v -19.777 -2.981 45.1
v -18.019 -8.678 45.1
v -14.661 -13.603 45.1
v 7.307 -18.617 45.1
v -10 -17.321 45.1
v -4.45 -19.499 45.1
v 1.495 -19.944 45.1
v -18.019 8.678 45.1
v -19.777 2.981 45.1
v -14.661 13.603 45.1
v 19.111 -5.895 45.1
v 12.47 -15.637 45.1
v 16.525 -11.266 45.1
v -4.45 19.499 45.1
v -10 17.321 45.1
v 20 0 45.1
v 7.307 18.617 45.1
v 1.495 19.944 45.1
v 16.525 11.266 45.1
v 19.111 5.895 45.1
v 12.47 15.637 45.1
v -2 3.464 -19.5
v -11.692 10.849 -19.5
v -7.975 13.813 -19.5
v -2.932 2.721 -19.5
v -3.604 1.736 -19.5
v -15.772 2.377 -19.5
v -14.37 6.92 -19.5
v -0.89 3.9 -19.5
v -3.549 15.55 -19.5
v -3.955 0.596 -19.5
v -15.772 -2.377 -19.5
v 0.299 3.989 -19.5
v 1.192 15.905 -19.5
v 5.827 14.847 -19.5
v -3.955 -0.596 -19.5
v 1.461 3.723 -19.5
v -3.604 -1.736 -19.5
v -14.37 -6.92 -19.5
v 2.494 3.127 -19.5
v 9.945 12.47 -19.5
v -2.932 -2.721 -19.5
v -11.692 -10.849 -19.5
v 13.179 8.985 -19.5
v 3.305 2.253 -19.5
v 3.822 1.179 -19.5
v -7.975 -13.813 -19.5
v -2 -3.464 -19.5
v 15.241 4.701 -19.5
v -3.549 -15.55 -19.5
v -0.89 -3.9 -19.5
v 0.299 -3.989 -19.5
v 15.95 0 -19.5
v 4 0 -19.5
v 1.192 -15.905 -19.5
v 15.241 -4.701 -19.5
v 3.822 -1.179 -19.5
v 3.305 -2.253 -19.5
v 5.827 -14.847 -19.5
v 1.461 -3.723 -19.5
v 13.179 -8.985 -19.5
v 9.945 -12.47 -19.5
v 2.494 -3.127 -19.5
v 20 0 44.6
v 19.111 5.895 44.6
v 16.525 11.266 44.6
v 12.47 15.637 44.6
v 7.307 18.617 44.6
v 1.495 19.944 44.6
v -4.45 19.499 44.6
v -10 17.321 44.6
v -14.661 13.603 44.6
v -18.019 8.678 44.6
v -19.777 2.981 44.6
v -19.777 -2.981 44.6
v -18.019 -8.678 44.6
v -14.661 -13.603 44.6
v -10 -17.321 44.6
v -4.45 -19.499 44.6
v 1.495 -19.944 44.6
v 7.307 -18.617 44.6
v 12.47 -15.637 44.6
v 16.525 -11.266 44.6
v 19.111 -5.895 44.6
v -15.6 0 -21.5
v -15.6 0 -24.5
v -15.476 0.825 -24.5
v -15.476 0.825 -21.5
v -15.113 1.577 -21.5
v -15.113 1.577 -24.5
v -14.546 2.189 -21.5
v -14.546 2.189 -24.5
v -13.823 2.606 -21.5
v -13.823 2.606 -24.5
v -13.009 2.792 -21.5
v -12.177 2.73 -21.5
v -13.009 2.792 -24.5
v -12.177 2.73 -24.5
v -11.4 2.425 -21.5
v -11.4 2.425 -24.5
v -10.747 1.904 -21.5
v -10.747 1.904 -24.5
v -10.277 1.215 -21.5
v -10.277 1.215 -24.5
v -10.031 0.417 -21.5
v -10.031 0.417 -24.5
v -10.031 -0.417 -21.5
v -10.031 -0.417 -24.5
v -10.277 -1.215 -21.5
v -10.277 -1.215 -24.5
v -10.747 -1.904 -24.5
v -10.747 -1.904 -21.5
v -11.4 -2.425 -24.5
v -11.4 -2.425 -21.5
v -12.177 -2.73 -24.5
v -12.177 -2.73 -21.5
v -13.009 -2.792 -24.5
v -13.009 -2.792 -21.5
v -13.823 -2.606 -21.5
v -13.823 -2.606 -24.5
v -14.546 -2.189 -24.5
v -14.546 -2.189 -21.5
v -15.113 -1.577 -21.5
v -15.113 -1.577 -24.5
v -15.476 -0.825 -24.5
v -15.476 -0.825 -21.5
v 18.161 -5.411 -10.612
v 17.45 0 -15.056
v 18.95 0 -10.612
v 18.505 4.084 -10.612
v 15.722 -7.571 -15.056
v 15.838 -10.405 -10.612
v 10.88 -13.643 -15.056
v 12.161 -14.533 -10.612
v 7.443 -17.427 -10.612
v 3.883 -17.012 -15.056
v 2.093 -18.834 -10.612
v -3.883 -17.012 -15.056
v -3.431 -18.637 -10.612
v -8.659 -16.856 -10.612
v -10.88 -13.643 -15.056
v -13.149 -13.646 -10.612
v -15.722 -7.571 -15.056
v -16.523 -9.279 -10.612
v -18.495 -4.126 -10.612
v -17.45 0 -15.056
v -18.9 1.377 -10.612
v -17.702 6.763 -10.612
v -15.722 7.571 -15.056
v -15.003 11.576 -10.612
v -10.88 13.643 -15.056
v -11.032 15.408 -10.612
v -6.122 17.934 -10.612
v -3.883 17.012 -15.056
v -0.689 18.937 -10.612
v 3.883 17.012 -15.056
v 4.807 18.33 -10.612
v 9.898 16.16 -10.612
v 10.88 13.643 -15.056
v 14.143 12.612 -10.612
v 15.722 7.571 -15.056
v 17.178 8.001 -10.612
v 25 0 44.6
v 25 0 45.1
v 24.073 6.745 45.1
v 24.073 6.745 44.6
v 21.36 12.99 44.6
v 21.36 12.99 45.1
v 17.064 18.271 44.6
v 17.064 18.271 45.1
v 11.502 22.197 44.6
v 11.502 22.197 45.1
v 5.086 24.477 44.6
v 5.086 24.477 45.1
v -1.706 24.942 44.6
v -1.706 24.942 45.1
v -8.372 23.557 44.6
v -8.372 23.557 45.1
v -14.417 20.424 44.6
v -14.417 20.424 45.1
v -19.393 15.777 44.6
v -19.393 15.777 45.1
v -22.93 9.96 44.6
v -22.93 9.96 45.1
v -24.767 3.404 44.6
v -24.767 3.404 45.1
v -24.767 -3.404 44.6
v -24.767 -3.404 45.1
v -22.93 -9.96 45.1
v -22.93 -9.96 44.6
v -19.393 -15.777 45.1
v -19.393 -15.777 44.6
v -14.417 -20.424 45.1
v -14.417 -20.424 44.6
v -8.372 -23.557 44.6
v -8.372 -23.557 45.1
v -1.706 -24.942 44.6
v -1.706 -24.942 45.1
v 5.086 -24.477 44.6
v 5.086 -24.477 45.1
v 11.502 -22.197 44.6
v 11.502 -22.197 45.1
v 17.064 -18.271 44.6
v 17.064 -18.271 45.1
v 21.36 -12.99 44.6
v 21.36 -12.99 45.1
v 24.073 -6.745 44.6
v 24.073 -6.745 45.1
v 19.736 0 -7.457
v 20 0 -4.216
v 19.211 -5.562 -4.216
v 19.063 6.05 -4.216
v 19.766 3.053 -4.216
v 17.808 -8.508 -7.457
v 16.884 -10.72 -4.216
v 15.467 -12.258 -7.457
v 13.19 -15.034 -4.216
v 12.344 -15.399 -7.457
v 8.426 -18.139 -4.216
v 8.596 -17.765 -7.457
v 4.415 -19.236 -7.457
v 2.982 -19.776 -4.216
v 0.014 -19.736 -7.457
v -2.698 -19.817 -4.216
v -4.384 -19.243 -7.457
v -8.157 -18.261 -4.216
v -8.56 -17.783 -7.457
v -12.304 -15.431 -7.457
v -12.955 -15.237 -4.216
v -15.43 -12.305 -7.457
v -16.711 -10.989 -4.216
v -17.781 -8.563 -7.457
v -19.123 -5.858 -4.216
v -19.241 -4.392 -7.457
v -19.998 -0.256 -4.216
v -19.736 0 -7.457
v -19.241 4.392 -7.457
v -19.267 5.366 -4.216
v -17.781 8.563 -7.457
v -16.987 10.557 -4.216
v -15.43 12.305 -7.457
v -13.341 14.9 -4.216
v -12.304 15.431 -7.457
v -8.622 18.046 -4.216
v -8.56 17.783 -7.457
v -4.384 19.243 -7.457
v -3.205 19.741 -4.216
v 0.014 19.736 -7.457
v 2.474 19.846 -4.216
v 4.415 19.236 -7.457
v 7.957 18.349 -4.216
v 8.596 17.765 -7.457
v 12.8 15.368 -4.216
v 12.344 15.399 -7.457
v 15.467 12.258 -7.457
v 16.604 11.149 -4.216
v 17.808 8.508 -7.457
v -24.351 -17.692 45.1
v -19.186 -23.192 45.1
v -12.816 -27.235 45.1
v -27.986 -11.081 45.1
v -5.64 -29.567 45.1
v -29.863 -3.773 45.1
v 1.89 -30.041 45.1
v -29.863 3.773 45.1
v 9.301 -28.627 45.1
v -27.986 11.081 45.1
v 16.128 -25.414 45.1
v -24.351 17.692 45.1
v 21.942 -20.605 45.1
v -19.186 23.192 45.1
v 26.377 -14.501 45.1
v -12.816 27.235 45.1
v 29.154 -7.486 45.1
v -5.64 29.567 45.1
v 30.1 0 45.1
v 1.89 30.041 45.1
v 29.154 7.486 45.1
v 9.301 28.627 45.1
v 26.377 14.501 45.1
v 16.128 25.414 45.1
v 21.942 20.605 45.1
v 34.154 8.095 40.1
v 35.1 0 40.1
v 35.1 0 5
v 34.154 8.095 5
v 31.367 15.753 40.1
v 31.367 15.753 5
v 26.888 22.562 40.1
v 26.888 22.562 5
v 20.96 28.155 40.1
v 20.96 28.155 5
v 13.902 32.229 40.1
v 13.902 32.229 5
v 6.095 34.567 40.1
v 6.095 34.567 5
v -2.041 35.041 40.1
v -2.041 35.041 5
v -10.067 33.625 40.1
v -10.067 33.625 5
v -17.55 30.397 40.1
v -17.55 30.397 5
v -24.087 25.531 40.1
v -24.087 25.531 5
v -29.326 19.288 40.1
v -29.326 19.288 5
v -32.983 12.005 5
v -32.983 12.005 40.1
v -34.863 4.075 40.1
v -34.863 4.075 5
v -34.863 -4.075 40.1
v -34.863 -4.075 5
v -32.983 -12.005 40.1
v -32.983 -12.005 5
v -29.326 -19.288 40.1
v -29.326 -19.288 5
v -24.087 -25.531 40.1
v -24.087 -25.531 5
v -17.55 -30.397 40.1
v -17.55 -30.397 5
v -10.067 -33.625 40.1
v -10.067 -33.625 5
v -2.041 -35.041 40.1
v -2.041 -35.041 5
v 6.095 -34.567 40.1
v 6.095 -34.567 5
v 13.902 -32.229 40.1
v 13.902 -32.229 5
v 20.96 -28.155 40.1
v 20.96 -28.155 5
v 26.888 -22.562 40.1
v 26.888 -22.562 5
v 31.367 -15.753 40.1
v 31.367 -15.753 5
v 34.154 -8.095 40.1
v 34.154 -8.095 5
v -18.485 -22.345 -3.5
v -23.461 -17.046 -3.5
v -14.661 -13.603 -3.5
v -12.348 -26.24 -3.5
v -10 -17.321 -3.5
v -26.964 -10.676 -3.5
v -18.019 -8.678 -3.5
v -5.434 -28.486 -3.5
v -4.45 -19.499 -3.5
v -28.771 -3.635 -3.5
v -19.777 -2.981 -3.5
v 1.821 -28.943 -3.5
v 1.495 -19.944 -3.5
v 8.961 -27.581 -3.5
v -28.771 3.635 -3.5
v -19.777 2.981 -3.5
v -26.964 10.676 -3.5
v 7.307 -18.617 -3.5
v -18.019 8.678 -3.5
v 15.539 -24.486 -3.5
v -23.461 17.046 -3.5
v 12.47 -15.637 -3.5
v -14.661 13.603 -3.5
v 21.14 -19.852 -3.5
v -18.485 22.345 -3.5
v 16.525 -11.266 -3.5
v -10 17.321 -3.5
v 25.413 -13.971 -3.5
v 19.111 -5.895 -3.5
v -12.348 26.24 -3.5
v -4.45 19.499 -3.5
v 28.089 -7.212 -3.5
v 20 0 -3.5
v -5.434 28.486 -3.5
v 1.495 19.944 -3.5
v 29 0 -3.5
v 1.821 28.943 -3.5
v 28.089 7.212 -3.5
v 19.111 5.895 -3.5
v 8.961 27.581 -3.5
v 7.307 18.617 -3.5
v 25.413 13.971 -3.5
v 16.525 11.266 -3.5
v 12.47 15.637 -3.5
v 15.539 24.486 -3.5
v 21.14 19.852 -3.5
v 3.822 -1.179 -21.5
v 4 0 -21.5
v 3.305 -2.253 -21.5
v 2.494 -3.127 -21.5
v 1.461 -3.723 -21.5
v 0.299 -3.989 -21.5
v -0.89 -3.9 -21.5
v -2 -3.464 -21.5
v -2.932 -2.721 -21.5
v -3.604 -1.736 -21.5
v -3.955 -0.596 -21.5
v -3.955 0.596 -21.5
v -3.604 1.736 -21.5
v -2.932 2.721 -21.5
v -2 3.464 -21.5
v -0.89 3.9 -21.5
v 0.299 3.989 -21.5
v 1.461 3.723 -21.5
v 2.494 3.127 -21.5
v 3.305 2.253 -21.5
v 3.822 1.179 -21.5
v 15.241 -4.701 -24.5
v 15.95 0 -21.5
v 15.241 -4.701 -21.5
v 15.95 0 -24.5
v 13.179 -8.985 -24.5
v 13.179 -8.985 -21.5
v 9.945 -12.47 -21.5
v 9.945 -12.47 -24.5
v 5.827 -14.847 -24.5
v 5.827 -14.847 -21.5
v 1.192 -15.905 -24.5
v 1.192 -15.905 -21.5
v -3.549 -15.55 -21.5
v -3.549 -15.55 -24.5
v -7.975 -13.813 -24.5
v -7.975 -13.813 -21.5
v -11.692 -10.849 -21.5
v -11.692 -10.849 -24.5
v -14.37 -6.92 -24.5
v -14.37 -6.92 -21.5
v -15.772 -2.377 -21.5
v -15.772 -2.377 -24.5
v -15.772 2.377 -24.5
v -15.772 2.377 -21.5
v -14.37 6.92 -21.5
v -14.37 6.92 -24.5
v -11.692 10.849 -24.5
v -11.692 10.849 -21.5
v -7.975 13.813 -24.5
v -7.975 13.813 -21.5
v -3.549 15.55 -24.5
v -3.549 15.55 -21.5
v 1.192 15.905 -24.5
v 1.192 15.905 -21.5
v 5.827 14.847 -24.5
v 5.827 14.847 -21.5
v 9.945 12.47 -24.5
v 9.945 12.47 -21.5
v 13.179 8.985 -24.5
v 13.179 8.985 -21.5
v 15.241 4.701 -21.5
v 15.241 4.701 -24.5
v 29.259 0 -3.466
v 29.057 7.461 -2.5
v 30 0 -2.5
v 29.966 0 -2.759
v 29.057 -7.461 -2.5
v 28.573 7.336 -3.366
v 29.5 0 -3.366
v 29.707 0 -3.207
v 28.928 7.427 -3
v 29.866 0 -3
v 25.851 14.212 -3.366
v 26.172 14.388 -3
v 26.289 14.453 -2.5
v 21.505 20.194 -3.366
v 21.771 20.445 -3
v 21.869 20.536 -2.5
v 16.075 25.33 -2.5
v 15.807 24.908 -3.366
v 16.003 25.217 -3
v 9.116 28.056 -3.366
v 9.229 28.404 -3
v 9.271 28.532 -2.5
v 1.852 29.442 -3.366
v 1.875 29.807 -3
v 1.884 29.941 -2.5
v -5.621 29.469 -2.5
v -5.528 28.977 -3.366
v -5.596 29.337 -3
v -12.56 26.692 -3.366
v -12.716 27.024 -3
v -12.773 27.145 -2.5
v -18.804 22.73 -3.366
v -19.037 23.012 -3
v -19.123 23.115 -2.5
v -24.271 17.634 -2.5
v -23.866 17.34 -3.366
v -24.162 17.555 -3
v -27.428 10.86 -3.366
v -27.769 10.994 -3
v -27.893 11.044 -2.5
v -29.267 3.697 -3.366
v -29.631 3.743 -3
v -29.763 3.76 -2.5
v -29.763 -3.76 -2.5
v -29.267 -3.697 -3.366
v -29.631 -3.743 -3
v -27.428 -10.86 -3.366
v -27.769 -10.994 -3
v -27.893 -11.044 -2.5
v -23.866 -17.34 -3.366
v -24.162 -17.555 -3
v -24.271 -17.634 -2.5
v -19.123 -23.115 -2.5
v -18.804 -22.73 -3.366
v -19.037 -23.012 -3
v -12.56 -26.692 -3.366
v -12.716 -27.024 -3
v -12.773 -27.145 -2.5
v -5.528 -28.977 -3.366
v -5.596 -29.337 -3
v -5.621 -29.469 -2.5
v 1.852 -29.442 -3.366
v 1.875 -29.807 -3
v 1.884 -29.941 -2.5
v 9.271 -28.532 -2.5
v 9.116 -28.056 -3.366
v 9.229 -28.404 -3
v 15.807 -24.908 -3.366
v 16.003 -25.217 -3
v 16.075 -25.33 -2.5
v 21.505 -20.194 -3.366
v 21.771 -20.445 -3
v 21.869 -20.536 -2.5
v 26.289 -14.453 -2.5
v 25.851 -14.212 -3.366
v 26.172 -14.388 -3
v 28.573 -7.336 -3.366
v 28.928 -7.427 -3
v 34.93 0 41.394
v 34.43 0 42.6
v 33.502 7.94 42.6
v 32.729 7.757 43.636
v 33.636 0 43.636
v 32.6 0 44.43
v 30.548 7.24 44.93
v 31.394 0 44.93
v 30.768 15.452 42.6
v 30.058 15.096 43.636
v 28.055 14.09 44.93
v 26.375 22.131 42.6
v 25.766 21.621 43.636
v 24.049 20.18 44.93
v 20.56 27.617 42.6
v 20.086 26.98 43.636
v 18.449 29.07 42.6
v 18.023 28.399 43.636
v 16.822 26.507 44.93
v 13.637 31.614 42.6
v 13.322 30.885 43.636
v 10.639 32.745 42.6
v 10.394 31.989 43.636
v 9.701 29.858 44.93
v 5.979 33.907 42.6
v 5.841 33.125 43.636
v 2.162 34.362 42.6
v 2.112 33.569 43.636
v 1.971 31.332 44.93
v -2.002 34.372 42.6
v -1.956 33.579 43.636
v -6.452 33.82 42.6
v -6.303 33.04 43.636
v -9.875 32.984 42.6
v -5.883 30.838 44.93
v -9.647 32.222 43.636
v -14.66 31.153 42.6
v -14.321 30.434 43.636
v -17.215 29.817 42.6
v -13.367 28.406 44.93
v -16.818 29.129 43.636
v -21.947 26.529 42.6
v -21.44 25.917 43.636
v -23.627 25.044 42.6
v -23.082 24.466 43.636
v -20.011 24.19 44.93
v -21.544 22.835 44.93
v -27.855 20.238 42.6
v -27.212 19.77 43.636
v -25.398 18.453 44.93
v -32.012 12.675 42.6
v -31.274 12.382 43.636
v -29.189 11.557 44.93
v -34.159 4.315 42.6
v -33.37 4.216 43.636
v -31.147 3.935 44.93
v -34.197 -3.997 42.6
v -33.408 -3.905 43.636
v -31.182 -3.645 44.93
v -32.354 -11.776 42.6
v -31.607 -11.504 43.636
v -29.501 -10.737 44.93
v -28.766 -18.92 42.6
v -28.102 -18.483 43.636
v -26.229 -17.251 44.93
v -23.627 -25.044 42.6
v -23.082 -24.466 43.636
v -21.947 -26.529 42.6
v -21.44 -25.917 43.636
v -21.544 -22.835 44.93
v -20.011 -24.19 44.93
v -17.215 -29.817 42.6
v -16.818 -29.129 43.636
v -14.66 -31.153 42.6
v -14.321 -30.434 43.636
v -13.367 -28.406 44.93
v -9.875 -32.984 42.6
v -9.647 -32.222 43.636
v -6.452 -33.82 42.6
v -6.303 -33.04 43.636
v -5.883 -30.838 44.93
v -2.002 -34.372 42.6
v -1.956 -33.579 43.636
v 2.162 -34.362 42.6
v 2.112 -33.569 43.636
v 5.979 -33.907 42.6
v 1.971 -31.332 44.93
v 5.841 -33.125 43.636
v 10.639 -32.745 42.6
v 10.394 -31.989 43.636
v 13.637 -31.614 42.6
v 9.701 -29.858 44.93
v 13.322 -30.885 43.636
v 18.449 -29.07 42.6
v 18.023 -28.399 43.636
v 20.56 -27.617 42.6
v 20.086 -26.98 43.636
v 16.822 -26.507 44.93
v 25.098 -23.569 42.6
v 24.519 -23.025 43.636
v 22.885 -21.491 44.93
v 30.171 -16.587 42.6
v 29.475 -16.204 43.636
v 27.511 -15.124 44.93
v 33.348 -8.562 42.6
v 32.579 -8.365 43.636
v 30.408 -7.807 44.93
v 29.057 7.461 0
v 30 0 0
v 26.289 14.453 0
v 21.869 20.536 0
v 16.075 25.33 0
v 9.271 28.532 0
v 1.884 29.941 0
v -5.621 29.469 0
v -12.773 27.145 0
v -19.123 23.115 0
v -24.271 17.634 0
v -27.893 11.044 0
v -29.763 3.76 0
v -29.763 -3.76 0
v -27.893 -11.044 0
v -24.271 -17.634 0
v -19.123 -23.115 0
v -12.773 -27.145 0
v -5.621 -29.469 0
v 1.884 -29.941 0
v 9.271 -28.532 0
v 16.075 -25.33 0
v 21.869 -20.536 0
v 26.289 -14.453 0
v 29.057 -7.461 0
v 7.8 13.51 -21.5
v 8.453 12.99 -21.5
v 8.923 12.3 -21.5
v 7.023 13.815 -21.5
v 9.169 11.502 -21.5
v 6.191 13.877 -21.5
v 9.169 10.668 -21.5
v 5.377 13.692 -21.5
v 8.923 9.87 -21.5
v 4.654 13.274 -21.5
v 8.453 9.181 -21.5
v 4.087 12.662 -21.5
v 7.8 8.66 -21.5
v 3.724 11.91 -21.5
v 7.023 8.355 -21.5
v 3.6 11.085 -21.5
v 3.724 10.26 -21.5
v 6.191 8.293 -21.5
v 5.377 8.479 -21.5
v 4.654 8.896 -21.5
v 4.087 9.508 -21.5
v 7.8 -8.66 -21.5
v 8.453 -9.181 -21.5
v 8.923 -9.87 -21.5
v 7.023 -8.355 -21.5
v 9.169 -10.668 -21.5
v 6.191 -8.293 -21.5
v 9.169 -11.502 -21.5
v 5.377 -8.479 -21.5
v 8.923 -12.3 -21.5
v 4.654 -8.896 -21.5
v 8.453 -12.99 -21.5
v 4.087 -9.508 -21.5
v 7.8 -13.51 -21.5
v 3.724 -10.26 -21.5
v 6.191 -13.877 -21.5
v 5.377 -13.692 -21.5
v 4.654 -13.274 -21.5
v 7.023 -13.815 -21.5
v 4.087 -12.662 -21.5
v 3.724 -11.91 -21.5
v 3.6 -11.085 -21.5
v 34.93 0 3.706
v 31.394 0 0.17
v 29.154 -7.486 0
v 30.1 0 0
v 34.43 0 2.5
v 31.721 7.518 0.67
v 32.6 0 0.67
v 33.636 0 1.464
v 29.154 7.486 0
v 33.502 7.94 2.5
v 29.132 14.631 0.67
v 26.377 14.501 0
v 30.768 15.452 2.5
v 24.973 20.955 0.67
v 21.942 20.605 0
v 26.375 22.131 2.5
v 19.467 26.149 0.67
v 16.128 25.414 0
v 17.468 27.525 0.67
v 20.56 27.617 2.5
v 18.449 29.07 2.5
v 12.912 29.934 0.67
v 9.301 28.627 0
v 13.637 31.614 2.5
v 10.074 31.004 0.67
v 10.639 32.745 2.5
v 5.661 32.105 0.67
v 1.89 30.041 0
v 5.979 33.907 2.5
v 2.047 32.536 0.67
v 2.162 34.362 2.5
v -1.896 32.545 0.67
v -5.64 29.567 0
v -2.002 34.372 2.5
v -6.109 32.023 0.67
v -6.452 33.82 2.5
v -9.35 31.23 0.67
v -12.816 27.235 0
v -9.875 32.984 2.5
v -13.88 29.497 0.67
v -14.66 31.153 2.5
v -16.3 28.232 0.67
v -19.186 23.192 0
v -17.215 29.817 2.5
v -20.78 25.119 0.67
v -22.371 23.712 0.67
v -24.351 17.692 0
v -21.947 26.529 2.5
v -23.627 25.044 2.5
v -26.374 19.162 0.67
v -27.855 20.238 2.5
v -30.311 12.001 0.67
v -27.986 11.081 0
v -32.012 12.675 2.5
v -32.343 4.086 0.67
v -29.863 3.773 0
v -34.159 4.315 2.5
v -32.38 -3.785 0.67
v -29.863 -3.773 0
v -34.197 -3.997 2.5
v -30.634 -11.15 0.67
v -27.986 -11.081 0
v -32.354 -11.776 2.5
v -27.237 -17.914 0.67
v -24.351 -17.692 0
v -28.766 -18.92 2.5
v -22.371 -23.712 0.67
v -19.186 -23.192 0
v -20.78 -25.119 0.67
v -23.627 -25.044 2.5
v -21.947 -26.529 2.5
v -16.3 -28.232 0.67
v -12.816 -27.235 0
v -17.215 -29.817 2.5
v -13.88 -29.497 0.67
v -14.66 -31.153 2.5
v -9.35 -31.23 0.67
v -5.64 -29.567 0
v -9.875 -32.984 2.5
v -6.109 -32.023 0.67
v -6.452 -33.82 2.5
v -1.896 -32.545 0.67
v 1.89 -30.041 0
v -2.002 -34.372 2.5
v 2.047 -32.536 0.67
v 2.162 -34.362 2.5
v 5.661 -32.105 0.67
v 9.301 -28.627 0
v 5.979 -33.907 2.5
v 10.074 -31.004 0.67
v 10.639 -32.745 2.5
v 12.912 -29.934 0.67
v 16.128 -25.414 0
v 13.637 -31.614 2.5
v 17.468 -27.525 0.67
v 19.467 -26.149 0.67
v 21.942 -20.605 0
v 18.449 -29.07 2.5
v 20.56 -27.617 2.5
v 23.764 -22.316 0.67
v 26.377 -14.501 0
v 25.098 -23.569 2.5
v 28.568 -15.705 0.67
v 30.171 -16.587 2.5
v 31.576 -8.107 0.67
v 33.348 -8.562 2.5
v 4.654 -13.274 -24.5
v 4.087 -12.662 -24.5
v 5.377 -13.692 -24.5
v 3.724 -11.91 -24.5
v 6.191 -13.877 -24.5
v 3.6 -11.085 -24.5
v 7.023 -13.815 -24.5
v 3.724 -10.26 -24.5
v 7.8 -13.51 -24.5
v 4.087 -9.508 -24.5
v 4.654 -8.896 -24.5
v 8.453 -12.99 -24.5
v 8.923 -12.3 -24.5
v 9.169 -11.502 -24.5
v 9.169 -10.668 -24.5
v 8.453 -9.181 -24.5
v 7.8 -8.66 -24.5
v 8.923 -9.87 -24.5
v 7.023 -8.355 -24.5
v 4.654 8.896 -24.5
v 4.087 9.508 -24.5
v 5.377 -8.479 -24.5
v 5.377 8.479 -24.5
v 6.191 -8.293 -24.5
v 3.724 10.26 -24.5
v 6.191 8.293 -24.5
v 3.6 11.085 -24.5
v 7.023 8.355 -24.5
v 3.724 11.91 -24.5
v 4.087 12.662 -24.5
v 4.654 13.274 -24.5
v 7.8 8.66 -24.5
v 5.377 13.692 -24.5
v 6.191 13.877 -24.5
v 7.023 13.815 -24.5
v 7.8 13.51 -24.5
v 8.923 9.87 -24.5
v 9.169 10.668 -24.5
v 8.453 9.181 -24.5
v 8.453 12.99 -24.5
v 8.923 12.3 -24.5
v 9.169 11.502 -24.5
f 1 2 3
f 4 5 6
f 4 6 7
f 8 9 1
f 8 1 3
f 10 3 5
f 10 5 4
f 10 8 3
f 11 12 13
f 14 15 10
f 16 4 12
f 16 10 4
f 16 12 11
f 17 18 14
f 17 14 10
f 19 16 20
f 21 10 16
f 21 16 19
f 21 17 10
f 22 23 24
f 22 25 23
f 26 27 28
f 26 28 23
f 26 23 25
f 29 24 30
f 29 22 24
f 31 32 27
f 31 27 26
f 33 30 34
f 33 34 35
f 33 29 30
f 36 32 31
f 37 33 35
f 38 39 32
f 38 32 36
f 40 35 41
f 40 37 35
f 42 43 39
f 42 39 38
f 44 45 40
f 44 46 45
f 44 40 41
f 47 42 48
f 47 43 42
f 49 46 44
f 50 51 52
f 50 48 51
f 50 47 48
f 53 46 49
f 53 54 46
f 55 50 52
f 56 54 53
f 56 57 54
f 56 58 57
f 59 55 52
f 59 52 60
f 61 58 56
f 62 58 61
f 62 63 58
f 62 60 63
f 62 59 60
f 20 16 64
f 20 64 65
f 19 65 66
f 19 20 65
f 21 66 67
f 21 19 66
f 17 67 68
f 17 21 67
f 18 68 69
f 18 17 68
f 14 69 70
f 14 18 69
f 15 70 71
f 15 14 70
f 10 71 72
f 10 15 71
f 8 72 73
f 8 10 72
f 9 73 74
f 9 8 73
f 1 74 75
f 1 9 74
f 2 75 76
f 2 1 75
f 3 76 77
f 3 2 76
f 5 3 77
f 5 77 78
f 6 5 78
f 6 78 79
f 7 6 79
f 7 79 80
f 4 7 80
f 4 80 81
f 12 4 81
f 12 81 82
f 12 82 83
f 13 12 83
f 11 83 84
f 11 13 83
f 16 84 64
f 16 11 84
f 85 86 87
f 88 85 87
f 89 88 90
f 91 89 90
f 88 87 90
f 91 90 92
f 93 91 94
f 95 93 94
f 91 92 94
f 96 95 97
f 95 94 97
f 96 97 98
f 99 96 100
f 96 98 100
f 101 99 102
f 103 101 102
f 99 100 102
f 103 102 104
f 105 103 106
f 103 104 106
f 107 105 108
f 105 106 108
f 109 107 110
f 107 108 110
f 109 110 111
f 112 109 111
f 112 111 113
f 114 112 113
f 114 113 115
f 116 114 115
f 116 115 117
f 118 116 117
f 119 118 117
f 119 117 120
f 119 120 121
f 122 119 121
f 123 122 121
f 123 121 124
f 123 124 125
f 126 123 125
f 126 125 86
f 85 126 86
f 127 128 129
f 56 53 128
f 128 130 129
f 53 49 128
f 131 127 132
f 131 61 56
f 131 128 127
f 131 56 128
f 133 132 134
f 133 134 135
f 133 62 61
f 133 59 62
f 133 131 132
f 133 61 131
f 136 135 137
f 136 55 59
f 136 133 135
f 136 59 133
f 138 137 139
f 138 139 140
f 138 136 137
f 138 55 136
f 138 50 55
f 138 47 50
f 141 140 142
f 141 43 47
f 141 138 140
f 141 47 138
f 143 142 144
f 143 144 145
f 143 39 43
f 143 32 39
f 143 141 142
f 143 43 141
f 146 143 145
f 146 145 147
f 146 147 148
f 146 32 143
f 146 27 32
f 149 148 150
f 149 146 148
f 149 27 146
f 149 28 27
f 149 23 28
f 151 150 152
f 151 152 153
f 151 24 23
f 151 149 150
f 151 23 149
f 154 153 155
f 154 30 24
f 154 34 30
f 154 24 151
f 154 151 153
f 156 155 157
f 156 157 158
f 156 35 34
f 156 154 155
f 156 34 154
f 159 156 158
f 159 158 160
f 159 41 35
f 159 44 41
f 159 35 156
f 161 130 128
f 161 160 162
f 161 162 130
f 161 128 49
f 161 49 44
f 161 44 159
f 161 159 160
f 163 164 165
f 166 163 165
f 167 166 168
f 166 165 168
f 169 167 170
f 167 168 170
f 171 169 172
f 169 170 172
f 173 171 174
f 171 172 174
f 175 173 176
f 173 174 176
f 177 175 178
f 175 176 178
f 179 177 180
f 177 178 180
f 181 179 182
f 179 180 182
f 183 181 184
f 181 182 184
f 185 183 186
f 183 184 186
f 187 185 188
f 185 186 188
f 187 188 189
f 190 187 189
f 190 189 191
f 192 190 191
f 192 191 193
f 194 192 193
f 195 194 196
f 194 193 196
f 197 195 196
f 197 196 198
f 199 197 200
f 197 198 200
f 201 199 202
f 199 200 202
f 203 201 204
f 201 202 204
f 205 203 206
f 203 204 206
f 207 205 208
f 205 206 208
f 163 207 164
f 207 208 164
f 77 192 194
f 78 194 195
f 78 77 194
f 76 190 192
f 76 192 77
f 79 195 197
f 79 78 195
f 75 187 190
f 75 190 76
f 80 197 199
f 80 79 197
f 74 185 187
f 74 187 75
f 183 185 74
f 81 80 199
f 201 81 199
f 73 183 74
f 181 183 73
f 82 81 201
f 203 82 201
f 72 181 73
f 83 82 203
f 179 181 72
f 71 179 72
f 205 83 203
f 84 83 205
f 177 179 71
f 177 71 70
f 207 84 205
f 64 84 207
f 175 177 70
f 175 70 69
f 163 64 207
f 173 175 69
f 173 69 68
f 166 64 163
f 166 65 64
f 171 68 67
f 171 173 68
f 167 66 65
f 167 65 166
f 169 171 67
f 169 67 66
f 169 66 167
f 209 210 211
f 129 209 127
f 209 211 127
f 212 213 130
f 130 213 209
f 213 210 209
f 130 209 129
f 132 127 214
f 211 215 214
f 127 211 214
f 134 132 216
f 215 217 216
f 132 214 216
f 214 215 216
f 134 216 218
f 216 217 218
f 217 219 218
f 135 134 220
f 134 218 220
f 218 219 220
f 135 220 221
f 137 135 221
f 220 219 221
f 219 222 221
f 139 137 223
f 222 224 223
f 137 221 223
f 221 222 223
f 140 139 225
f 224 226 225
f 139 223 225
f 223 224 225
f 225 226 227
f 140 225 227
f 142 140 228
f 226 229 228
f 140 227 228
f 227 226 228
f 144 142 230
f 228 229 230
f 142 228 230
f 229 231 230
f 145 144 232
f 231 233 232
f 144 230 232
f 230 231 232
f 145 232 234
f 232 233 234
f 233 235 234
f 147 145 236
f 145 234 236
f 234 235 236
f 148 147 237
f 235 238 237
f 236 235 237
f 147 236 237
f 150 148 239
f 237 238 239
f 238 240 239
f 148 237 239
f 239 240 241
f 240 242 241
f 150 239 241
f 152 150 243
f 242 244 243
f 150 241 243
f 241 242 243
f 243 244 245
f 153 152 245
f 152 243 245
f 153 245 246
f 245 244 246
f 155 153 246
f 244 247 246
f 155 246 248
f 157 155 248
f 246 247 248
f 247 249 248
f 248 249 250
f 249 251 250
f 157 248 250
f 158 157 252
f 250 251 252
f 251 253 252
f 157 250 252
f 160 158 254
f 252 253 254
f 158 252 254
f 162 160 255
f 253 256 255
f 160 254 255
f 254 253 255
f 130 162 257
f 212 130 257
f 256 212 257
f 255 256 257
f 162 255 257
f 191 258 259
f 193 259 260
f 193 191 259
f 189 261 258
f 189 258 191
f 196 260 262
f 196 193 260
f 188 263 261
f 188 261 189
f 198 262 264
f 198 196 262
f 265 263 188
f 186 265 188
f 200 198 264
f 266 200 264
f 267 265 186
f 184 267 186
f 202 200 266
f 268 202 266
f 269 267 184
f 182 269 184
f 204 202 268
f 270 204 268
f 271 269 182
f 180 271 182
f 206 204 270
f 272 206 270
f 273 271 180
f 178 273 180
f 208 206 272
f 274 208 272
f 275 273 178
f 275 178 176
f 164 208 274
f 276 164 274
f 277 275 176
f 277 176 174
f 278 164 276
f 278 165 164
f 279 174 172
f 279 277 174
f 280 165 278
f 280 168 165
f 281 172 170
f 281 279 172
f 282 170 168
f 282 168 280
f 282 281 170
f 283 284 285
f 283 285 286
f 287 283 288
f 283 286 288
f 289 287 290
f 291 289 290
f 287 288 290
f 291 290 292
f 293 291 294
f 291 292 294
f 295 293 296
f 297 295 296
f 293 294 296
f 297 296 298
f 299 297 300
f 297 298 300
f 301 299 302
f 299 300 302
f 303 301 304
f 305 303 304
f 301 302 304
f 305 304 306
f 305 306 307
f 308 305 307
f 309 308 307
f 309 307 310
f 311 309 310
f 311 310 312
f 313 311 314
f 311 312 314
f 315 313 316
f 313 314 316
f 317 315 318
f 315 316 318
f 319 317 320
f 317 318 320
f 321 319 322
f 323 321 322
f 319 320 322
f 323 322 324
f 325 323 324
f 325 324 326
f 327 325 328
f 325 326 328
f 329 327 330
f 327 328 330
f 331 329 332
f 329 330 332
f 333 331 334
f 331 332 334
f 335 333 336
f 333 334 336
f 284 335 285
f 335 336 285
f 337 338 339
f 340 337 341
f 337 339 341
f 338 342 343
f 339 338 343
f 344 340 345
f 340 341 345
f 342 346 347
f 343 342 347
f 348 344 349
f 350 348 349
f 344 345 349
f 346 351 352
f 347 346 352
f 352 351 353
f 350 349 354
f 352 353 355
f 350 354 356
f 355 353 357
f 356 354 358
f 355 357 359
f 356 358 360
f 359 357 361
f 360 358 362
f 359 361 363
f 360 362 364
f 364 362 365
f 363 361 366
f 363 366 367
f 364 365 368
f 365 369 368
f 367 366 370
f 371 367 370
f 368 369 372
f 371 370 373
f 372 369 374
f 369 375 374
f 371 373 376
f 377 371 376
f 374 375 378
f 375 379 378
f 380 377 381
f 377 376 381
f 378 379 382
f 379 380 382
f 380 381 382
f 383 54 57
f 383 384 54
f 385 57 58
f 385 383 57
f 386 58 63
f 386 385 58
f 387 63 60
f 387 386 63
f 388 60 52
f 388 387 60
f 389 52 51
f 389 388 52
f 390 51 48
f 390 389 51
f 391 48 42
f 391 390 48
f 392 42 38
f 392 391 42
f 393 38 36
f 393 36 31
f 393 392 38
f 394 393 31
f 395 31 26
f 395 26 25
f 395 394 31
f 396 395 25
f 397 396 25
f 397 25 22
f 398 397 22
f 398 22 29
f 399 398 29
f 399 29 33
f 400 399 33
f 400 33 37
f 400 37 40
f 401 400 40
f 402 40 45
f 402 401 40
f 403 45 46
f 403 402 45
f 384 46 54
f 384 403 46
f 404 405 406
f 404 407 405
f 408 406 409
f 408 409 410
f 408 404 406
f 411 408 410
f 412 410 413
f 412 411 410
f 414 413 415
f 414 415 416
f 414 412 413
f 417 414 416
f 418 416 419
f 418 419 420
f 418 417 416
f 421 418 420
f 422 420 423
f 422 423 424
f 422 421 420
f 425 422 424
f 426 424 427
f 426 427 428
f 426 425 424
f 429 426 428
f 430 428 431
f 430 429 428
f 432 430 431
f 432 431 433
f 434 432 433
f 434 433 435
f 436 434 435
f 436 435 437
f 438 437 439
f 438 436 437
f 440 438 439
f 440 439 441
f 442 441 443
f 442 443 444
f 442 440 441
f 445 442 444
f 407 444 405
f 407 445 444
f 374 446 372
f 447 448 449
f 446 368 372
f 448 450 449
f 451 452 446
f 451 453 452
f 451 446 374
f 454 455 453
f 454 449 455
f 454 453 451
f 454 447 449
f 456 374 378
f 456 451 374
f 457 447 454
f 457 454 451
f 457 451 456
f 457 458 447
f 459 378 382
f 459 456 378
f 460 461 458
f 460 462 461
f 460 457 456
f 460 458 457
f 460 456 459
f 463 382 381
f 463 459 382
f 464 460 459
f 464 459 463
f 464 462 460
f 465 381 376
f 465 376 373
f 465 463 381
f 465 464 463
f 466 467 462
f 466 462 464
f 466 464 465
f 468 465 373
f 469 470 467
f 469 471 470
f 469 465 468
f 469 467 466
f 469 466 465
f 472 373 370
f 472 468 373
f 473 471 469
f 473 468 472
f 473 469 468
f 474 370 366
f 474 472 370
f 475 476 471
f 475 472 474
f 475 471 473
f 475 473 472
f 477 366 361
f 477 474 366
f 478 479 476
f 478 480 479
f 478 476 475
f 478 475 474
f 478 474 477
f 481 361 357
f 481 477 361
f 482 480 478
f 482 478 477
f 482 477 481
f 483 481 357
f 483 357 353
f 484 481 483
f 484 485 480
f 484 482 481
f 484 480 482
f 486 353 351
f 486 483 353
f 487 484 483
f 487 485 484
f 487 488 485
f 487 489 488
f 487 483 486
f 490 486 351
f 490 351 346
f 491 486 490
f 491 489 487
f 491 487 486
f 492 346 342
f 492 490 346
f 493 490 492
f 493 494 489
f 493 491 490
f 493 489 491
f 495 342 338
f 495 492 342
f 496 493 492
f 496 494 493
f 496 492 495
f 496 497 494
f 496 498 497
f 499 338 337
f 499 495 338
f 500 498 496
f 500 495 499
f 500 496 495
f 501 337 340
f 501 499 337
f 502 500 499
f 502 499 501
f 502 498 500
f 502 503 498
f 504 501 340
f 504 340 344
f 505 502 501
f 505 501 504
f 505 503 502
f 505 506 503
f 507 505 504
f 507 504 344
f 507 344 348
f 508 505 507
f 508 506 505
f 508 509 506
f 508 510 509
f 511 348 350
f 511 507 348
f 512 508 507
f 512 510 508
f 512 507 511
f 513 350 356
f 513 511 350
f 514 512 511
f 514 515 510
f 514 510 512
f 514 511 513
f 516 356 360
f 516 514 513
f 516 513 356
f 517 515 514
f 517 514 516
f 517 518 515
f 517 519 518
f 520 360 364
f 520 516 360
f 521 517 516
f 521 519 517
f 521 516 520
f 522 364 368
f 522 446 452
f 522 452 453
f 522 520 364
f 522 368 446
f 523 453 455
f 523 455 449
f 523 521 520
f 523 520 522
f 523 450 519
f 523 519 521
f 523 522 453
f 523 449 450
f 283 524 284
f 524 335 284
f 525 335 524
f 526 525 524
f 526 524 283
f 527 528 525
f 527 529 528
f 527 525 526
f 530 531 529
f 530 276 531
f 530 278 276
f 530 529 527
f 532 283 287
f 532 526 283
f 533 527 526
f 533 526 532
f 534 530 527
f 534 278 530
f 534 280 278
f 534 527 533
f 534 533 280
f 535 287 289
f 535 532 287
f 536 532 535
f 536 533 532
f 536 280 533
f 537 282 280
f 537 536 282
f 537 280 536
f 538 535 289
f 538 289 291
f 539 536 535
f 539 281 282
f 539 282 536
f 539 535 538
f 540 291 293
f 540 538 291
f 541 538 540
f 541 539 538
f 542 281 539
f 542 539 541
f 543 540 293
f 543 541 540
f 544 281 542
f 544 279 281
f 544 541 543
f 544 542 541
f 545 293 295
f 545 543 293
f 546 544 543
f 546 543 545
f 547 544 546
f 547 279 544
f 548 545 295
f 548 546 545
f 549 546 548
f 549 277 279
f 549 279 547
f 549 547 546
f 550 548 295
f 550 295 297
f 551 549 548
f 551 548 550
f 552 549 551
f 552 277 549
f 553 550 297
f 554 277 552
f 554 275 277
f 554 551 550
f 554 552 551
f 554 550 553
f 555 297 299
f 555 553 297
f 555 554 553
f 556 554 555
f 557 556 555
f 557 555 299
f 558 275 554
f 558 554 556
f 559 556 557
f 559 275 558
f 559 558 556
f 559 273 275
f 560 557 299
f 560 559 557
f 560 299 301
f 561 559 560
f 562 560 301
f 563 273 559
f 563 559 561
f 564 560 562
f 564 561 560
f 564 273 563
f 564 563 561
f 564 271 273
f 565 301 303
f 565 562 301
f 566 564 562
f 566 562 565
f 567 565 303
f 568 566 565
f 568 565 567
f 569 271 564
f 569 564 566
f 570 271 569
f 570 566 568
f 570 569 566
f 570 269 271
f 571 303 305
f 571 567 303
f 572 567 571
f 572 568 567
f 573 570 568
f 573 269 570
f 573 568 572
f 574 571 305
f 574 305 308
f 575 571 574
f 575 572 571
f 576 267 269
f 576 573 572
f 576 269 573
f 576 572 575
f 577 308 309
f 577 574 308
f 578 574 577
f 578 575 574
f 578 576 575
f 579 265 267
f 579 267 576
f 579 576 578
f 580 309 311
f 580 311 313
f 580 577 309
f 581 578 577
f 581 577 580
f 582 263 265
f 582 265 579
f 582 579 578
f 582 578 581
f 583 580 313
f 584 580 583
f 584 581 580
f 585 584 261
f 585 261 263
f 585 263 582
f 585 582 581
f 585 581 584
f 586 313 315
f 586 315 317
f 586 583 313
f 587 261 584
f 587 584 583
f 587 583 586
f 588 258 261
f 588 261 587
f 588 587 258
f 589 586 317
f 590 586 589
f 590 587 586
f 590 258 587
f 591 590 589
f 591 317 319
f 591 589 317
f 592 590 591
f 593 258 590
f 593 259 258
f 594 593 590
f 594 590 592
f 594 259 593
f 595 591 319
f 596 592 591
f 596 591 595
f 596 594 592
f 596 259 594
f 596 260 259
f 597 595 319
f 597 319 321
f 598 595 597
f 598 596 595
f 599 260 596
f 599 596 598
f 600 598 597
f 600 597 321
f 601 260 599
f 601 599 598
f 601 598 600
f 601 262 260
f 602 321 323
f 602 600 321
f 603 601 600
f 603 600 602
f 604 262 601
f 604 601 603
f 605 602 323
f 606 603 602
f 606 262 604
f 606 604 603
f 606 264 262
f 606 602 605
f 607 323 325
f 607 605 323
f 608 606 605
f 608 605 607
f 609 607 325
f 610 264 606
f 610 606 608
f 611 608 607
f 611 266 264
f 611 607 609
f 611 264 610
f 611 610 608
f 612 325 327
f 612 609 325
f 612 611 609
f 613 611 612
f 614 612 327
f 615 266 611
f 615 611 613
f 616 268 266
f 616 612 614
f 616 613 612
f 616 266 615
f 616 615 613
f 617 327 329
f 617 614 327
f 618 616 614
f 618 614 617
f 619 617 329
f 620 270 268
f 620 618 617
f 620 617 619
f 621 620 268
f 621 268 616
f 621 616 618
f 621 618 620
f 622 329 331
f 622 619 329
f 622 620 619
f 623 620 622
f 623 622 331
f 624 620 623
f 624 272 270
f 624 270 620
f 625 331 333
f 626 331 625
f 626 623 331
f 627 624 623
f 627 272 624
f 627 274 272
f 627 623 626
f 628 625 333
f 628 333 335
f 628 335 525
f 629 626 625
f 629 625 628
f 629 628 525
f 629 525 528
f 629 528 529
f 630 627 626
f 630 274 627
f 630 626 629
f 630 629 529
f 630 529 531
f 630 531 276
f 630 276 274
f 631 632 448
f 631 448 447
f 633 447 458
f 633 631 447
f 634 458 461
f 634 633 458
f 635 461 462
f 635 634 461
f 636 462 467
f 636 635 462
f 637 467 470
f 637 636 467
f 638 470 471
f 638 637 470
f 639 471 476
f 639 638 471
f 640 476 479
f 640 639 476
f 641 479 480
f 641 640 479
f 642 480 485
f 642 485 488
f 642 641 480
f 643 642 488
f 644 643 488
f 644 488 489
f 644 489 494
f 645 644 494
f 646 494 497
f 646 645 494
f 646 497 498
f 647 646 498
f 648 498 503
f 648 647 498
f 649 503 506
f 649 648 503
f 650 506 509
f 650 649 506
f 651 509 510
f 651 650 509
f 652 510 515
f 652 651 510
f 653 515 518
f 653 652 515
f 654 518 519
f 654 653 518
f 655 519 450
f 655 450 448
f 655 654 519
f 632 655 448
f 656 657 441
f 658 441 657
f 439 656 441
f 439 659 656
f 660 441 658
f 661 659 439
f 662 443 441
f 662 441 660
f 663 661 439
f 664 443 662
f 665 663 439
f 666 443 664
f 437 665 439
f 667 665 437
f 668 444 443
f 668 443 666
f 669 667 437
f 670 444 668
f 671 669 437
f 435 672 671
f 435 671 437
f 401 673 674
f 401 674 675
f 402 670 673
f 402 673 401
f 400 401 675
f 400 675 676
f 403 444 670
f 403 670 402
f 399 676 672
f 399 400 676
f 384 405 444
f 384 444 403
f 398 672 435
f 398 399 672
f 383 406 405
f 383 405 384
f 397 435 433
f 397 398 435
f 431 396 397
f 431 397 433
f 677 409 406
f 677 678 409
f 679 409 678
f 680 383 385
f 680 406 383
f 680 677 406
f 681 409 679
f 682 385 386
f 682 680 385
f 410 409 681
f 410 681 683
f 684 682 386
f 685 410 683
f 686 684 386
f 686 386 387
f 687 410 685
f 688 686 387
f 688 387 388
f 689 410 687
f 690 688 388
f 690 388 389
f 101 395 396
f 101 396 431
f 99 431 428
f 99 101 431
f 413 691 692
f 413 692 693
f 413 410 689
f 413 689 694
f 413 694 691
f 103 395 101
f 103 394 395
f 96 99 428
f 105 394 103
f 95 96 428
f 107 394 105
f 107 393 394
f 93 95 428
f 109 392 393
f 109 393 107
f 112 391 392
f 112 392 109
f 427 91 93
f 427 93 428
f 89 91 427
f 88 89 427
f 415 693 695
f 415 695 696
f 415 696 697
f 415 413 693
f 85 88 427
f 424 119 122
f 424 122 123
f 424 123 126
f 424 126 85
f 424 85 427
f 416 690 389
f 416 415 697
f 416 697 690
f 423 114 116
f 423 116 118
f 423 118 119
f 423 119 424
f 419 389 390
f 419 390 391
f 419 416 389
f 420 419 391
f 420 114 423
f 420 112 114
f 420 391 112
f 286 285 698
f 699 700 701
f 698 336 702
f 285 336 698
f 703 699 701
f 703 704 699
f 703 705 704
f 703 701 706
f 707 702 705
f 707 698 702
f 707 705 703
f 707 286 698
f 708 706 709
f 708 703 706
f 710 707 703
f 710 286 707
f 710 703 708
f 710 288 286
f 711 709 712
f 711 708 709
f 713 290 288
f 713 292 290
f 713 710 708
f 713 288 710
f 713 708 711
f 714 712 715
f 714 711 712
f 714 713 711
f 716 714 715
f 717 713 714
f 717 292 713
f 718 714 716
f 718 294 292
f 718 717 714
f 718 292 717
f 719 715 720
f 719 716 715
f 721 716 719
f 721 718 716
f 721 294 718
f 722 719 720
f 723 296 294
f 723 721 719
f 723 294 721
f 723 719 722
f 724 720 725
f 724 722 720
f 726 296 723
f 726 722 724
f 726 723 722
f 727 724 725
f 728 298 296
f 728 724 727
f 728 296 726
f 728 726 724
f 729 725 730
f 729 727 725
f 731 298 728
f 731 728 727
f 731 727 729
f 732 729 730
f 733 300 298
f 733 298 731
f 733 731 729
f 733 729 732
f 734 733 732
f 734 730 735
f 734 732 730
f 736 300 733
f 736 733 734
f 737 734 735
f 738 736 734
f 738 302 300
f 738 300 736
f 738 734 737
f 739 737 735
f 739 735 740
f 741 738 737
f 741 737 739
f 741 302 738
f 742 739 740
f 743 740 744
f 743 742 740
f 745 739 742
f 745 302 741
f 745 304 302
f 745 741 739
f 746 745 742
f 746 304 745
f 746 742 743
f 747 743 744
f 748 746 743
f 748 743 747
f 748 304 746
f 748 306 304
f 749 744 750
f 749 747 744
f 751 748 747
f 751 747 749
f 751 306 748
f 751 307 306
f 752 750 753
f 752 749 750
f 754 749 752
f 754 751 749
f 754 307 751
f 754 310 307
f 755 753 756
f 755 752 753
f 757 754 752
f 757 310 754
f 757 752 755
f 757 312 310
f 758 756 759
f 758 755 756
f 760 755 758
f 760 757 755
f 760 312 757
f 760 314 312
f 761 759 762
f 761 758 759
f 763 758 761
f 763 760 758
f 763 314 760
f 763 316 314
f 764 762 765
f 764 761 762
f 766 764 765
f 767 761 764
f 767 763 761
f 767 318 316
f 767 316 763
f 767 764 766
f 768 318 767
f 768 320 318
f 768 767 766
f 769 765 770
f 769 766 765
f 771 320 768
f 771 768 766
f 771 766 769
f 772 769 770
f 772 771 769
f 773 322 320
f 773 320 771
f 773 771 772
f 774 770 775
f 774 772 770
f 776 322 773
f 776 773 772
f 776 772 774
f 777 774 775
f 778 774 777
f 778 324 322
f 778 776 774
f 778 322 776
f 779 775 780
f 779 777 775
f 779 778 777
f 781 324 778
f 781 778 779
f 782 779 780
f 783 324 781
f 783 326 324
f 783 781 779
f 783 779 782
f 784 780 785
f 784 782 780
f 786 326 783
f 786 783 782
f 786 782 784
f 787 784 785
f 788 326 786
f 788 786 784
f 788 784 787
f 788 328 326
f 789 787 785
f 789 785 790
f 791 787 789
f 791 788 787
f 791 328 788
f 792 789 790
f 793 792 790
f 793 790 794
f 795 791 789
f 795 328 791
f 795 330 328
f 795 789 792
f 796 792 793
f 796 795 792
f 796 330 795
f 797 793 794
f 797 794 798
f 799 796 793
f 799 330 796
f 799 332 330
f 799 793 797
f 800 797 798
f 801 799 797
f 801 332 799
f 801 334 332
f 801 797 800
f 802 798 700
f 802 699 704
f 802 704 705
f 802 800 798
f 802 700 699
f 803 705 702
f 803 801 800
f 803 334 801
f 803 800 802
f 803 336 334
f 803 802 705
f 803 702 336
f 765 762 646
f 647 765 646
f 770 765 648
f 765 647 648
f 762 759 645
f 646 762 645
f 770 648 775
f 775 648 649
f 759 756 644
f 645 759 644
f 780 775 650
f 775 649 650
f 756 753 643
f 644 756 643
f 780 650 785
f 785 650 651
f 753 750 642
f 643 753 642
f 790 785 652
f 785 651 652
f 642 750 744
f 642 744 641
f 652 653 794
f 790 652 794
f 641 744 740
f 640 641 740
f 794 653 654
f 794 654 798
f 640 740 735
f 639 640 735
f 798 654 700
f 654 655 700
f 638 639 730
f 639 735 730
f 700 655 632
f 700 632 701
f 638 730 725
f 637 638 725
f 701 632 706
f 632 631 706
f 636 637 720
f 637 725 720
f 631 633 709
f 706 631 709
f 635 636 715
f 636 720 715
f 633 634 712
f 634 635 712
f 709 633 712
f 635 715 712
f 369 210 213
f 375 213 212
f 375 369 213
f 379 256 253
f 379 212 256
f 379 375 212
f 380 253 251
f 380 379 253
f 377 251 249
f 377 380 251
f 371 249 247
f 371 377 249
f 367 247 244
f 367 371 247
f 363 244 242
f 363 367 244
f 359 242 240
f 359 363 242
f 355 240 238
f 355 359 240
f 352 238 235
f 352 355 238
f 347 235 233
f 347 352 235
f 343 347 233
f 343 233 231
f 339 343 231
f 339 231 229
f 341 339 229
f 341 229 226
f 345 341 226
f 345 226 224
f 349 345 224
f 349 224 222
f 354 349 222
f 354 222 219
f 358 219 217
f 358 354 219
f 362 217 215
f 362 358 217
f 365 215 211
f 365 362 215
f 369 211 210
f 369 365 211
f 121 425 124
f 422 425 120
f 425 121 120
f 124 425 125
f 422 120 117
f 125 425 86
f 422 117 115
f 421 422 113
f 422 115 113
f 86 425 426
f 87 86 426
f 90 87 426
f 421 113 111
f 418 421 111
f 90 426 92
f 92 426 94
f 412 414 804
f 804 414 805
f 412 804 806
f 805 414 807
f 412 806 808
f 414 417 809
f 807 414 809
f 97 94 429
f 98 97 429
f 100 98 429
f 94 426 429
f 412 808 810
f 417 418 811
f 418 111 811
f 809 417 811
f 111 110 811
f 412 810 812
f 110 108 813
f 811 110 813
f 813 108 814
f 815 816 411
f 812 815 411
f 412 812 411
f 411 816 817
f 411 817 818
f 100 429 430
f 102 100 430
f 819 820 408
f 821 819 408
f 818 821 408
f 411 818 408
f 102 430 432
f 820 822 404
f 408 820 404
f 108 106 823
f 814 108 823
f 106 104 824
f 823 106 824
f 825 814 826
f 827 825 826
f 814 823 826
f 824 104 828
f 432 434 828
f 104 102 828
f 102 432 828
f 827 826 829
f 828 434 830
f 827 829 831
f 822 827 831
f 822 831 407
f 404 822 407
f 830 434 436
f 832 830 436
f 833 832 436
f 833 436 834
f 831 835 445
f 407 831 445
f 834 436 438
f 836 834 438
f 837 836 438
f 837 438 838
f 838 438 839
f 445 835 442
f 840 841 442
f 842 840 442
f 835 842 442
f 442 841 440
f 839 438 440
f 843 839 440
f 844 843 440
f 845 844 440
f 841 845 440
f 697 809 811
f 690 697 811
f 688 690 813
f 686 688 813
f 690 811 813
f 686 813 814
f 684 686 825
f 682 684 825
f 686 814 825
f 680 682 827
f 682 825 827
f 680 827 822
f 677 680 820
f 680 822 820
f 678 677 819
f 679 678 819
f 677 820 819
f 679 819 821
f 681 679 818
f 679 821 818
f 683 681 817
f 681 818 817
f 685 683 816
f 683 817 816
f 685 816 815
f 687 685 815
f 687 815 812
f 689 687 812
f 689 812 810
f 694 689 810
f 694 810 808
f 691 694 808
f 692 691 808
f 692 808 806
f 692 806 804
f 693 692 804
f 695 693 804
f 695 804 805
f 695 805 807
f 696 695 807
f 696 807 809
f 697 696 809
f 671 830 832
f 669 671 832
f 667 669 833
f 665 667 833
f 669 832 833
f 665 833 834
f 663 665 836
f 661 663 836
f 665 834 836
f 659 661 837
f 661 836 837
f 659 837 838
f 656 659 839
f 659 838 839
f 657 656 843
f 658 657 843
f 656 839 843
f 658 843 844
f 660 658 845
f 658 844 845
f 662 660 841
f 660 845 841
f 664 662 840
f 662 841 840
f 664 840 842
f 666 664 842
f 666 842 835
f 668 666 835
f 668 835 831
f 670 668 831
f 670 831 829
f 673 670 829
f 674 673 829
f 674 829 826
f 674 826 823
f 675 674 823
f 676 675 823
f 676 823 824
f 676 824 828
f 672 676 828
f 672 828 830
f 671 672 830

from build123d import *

# Parameters (mm, degrees)
SKETCH_1_R          = 35.1
EXTRUDE_1_DEPTH     = 45.1
SKETCH_3_R          = 30
SKETCH_3_R_2        = 20
EXTRUDE_2_DEPTH     = 3.5
SKETCH_3_4_R        = 20
EXTRUDE_3_DEPTH     = 24.5
FILLET_1_R          = 5
FILLET_2_R          = 20
FILLET_3_R          = 1
SKETCH_6_R          = 2.8
CUT_EXTRUDE_1_DEPTH = 4
SKETCH_7_R          = 25
SKETCH_7_R_2        = 20
CUT_EXTRUDE_2_DEPTH = 0.5


with BuildPart() as part:
    # 스케치1 → 보스-돌출1 (new body)
    with BuildSketch(Plane.XY):
        Circle(SKETCH_1_R)
    extrude(amount=EXTRUDE_1_DEPTH)

    # 스케치3 → 보스-돌출2 (add)
    with BuildSketch(Plane.XY):
        Circle(SKETCH_3_R)
        Circle(SKETCH_3_R_2, mode=Mode.SUBTRACT)
    extrude(amount=-EXTRUDE_2_DEPTH)

    # 스케치3<4> → 보스-돌출3 (add)
    with BuildSketch(Plane.XY):
        Circle(SKETCH_3_4_R)
    extrude(amount=-EXTRUDE_3_DEPTH)

    # 스케치4 → 컷-회전2 (revolve, cut)
    with BuildSketch(Plane(origin=(0, 0, 0), x_dir=(1, 0, 0), z_dir=(0, 1, 0))):
        Polygon((-15.95, 24.5), (-20, 24.5), (-20, 7.5), (-15.95, 19.5), (-4, 19.5), (-4, 21.5), (-15.95, 21.5), align=None)
    revolve(axis=Axis((0, 0, -24.5), (0, 0, -1)), mode=Mode.SUBTRACT)

    # 필렛1
    fillet_1_edges = [part.edges().sort_by_distance(p)[0] for p in [
        (-35.1, 0, 45.1),
        (-35.1, 0, 0),
    ]]
    fillet(fillet_1_edges, radius=FILLET_1_R)

    # 필렛2
    fillet_2_edges = [part.edges().sort_by_distance(p)[0] for p in [
        (0, -20, -7.5),
    ]]
    fillet(fillet_2_edges, radius=FILLET_2_R)

    # 필렛3
    fillet_3_edges = [part.edges().sort_by_distance(p)[0] for p in [
        (-30, 0, -3.5),
    ]]
    fillet(fillet_3_edges, radius=FILLET_3_R)

    # 스케치6 → 컷-돌출1 (cut)
    with BuildSketch(Plane(origin=(0, 0, -24.5), x_dir=(-1, 0, 0), z_dir=(0, 0, -1))):
        with Locations((12.8, 0)):
            Circle(SKETCH_6_R)
        with Locations((-6.4, 11.085125168)):
            Circle(SKETCH_6_R)
        with Locations((-6.4, -11.085125168)):
            Circle(SKETCH_6_R)
    extrude(amount=-CUT_EXTRUDE_1_DEPTH, mode=Mode.SUBTRACT)

    # 스케치7 → 컷-돌출2 (cut)
    with BuildSketch(Plane.XY.offset(45.1)):
        Circle(SKETCH_7_R)
        Circle(SKETCH_7_R_2, mode=Mode.SUBTRACT)
    extrude(amount=-CUT_EXTRUDE_2_DEPTH, mode=Mode.SUBTRACT)


solid = part.part
